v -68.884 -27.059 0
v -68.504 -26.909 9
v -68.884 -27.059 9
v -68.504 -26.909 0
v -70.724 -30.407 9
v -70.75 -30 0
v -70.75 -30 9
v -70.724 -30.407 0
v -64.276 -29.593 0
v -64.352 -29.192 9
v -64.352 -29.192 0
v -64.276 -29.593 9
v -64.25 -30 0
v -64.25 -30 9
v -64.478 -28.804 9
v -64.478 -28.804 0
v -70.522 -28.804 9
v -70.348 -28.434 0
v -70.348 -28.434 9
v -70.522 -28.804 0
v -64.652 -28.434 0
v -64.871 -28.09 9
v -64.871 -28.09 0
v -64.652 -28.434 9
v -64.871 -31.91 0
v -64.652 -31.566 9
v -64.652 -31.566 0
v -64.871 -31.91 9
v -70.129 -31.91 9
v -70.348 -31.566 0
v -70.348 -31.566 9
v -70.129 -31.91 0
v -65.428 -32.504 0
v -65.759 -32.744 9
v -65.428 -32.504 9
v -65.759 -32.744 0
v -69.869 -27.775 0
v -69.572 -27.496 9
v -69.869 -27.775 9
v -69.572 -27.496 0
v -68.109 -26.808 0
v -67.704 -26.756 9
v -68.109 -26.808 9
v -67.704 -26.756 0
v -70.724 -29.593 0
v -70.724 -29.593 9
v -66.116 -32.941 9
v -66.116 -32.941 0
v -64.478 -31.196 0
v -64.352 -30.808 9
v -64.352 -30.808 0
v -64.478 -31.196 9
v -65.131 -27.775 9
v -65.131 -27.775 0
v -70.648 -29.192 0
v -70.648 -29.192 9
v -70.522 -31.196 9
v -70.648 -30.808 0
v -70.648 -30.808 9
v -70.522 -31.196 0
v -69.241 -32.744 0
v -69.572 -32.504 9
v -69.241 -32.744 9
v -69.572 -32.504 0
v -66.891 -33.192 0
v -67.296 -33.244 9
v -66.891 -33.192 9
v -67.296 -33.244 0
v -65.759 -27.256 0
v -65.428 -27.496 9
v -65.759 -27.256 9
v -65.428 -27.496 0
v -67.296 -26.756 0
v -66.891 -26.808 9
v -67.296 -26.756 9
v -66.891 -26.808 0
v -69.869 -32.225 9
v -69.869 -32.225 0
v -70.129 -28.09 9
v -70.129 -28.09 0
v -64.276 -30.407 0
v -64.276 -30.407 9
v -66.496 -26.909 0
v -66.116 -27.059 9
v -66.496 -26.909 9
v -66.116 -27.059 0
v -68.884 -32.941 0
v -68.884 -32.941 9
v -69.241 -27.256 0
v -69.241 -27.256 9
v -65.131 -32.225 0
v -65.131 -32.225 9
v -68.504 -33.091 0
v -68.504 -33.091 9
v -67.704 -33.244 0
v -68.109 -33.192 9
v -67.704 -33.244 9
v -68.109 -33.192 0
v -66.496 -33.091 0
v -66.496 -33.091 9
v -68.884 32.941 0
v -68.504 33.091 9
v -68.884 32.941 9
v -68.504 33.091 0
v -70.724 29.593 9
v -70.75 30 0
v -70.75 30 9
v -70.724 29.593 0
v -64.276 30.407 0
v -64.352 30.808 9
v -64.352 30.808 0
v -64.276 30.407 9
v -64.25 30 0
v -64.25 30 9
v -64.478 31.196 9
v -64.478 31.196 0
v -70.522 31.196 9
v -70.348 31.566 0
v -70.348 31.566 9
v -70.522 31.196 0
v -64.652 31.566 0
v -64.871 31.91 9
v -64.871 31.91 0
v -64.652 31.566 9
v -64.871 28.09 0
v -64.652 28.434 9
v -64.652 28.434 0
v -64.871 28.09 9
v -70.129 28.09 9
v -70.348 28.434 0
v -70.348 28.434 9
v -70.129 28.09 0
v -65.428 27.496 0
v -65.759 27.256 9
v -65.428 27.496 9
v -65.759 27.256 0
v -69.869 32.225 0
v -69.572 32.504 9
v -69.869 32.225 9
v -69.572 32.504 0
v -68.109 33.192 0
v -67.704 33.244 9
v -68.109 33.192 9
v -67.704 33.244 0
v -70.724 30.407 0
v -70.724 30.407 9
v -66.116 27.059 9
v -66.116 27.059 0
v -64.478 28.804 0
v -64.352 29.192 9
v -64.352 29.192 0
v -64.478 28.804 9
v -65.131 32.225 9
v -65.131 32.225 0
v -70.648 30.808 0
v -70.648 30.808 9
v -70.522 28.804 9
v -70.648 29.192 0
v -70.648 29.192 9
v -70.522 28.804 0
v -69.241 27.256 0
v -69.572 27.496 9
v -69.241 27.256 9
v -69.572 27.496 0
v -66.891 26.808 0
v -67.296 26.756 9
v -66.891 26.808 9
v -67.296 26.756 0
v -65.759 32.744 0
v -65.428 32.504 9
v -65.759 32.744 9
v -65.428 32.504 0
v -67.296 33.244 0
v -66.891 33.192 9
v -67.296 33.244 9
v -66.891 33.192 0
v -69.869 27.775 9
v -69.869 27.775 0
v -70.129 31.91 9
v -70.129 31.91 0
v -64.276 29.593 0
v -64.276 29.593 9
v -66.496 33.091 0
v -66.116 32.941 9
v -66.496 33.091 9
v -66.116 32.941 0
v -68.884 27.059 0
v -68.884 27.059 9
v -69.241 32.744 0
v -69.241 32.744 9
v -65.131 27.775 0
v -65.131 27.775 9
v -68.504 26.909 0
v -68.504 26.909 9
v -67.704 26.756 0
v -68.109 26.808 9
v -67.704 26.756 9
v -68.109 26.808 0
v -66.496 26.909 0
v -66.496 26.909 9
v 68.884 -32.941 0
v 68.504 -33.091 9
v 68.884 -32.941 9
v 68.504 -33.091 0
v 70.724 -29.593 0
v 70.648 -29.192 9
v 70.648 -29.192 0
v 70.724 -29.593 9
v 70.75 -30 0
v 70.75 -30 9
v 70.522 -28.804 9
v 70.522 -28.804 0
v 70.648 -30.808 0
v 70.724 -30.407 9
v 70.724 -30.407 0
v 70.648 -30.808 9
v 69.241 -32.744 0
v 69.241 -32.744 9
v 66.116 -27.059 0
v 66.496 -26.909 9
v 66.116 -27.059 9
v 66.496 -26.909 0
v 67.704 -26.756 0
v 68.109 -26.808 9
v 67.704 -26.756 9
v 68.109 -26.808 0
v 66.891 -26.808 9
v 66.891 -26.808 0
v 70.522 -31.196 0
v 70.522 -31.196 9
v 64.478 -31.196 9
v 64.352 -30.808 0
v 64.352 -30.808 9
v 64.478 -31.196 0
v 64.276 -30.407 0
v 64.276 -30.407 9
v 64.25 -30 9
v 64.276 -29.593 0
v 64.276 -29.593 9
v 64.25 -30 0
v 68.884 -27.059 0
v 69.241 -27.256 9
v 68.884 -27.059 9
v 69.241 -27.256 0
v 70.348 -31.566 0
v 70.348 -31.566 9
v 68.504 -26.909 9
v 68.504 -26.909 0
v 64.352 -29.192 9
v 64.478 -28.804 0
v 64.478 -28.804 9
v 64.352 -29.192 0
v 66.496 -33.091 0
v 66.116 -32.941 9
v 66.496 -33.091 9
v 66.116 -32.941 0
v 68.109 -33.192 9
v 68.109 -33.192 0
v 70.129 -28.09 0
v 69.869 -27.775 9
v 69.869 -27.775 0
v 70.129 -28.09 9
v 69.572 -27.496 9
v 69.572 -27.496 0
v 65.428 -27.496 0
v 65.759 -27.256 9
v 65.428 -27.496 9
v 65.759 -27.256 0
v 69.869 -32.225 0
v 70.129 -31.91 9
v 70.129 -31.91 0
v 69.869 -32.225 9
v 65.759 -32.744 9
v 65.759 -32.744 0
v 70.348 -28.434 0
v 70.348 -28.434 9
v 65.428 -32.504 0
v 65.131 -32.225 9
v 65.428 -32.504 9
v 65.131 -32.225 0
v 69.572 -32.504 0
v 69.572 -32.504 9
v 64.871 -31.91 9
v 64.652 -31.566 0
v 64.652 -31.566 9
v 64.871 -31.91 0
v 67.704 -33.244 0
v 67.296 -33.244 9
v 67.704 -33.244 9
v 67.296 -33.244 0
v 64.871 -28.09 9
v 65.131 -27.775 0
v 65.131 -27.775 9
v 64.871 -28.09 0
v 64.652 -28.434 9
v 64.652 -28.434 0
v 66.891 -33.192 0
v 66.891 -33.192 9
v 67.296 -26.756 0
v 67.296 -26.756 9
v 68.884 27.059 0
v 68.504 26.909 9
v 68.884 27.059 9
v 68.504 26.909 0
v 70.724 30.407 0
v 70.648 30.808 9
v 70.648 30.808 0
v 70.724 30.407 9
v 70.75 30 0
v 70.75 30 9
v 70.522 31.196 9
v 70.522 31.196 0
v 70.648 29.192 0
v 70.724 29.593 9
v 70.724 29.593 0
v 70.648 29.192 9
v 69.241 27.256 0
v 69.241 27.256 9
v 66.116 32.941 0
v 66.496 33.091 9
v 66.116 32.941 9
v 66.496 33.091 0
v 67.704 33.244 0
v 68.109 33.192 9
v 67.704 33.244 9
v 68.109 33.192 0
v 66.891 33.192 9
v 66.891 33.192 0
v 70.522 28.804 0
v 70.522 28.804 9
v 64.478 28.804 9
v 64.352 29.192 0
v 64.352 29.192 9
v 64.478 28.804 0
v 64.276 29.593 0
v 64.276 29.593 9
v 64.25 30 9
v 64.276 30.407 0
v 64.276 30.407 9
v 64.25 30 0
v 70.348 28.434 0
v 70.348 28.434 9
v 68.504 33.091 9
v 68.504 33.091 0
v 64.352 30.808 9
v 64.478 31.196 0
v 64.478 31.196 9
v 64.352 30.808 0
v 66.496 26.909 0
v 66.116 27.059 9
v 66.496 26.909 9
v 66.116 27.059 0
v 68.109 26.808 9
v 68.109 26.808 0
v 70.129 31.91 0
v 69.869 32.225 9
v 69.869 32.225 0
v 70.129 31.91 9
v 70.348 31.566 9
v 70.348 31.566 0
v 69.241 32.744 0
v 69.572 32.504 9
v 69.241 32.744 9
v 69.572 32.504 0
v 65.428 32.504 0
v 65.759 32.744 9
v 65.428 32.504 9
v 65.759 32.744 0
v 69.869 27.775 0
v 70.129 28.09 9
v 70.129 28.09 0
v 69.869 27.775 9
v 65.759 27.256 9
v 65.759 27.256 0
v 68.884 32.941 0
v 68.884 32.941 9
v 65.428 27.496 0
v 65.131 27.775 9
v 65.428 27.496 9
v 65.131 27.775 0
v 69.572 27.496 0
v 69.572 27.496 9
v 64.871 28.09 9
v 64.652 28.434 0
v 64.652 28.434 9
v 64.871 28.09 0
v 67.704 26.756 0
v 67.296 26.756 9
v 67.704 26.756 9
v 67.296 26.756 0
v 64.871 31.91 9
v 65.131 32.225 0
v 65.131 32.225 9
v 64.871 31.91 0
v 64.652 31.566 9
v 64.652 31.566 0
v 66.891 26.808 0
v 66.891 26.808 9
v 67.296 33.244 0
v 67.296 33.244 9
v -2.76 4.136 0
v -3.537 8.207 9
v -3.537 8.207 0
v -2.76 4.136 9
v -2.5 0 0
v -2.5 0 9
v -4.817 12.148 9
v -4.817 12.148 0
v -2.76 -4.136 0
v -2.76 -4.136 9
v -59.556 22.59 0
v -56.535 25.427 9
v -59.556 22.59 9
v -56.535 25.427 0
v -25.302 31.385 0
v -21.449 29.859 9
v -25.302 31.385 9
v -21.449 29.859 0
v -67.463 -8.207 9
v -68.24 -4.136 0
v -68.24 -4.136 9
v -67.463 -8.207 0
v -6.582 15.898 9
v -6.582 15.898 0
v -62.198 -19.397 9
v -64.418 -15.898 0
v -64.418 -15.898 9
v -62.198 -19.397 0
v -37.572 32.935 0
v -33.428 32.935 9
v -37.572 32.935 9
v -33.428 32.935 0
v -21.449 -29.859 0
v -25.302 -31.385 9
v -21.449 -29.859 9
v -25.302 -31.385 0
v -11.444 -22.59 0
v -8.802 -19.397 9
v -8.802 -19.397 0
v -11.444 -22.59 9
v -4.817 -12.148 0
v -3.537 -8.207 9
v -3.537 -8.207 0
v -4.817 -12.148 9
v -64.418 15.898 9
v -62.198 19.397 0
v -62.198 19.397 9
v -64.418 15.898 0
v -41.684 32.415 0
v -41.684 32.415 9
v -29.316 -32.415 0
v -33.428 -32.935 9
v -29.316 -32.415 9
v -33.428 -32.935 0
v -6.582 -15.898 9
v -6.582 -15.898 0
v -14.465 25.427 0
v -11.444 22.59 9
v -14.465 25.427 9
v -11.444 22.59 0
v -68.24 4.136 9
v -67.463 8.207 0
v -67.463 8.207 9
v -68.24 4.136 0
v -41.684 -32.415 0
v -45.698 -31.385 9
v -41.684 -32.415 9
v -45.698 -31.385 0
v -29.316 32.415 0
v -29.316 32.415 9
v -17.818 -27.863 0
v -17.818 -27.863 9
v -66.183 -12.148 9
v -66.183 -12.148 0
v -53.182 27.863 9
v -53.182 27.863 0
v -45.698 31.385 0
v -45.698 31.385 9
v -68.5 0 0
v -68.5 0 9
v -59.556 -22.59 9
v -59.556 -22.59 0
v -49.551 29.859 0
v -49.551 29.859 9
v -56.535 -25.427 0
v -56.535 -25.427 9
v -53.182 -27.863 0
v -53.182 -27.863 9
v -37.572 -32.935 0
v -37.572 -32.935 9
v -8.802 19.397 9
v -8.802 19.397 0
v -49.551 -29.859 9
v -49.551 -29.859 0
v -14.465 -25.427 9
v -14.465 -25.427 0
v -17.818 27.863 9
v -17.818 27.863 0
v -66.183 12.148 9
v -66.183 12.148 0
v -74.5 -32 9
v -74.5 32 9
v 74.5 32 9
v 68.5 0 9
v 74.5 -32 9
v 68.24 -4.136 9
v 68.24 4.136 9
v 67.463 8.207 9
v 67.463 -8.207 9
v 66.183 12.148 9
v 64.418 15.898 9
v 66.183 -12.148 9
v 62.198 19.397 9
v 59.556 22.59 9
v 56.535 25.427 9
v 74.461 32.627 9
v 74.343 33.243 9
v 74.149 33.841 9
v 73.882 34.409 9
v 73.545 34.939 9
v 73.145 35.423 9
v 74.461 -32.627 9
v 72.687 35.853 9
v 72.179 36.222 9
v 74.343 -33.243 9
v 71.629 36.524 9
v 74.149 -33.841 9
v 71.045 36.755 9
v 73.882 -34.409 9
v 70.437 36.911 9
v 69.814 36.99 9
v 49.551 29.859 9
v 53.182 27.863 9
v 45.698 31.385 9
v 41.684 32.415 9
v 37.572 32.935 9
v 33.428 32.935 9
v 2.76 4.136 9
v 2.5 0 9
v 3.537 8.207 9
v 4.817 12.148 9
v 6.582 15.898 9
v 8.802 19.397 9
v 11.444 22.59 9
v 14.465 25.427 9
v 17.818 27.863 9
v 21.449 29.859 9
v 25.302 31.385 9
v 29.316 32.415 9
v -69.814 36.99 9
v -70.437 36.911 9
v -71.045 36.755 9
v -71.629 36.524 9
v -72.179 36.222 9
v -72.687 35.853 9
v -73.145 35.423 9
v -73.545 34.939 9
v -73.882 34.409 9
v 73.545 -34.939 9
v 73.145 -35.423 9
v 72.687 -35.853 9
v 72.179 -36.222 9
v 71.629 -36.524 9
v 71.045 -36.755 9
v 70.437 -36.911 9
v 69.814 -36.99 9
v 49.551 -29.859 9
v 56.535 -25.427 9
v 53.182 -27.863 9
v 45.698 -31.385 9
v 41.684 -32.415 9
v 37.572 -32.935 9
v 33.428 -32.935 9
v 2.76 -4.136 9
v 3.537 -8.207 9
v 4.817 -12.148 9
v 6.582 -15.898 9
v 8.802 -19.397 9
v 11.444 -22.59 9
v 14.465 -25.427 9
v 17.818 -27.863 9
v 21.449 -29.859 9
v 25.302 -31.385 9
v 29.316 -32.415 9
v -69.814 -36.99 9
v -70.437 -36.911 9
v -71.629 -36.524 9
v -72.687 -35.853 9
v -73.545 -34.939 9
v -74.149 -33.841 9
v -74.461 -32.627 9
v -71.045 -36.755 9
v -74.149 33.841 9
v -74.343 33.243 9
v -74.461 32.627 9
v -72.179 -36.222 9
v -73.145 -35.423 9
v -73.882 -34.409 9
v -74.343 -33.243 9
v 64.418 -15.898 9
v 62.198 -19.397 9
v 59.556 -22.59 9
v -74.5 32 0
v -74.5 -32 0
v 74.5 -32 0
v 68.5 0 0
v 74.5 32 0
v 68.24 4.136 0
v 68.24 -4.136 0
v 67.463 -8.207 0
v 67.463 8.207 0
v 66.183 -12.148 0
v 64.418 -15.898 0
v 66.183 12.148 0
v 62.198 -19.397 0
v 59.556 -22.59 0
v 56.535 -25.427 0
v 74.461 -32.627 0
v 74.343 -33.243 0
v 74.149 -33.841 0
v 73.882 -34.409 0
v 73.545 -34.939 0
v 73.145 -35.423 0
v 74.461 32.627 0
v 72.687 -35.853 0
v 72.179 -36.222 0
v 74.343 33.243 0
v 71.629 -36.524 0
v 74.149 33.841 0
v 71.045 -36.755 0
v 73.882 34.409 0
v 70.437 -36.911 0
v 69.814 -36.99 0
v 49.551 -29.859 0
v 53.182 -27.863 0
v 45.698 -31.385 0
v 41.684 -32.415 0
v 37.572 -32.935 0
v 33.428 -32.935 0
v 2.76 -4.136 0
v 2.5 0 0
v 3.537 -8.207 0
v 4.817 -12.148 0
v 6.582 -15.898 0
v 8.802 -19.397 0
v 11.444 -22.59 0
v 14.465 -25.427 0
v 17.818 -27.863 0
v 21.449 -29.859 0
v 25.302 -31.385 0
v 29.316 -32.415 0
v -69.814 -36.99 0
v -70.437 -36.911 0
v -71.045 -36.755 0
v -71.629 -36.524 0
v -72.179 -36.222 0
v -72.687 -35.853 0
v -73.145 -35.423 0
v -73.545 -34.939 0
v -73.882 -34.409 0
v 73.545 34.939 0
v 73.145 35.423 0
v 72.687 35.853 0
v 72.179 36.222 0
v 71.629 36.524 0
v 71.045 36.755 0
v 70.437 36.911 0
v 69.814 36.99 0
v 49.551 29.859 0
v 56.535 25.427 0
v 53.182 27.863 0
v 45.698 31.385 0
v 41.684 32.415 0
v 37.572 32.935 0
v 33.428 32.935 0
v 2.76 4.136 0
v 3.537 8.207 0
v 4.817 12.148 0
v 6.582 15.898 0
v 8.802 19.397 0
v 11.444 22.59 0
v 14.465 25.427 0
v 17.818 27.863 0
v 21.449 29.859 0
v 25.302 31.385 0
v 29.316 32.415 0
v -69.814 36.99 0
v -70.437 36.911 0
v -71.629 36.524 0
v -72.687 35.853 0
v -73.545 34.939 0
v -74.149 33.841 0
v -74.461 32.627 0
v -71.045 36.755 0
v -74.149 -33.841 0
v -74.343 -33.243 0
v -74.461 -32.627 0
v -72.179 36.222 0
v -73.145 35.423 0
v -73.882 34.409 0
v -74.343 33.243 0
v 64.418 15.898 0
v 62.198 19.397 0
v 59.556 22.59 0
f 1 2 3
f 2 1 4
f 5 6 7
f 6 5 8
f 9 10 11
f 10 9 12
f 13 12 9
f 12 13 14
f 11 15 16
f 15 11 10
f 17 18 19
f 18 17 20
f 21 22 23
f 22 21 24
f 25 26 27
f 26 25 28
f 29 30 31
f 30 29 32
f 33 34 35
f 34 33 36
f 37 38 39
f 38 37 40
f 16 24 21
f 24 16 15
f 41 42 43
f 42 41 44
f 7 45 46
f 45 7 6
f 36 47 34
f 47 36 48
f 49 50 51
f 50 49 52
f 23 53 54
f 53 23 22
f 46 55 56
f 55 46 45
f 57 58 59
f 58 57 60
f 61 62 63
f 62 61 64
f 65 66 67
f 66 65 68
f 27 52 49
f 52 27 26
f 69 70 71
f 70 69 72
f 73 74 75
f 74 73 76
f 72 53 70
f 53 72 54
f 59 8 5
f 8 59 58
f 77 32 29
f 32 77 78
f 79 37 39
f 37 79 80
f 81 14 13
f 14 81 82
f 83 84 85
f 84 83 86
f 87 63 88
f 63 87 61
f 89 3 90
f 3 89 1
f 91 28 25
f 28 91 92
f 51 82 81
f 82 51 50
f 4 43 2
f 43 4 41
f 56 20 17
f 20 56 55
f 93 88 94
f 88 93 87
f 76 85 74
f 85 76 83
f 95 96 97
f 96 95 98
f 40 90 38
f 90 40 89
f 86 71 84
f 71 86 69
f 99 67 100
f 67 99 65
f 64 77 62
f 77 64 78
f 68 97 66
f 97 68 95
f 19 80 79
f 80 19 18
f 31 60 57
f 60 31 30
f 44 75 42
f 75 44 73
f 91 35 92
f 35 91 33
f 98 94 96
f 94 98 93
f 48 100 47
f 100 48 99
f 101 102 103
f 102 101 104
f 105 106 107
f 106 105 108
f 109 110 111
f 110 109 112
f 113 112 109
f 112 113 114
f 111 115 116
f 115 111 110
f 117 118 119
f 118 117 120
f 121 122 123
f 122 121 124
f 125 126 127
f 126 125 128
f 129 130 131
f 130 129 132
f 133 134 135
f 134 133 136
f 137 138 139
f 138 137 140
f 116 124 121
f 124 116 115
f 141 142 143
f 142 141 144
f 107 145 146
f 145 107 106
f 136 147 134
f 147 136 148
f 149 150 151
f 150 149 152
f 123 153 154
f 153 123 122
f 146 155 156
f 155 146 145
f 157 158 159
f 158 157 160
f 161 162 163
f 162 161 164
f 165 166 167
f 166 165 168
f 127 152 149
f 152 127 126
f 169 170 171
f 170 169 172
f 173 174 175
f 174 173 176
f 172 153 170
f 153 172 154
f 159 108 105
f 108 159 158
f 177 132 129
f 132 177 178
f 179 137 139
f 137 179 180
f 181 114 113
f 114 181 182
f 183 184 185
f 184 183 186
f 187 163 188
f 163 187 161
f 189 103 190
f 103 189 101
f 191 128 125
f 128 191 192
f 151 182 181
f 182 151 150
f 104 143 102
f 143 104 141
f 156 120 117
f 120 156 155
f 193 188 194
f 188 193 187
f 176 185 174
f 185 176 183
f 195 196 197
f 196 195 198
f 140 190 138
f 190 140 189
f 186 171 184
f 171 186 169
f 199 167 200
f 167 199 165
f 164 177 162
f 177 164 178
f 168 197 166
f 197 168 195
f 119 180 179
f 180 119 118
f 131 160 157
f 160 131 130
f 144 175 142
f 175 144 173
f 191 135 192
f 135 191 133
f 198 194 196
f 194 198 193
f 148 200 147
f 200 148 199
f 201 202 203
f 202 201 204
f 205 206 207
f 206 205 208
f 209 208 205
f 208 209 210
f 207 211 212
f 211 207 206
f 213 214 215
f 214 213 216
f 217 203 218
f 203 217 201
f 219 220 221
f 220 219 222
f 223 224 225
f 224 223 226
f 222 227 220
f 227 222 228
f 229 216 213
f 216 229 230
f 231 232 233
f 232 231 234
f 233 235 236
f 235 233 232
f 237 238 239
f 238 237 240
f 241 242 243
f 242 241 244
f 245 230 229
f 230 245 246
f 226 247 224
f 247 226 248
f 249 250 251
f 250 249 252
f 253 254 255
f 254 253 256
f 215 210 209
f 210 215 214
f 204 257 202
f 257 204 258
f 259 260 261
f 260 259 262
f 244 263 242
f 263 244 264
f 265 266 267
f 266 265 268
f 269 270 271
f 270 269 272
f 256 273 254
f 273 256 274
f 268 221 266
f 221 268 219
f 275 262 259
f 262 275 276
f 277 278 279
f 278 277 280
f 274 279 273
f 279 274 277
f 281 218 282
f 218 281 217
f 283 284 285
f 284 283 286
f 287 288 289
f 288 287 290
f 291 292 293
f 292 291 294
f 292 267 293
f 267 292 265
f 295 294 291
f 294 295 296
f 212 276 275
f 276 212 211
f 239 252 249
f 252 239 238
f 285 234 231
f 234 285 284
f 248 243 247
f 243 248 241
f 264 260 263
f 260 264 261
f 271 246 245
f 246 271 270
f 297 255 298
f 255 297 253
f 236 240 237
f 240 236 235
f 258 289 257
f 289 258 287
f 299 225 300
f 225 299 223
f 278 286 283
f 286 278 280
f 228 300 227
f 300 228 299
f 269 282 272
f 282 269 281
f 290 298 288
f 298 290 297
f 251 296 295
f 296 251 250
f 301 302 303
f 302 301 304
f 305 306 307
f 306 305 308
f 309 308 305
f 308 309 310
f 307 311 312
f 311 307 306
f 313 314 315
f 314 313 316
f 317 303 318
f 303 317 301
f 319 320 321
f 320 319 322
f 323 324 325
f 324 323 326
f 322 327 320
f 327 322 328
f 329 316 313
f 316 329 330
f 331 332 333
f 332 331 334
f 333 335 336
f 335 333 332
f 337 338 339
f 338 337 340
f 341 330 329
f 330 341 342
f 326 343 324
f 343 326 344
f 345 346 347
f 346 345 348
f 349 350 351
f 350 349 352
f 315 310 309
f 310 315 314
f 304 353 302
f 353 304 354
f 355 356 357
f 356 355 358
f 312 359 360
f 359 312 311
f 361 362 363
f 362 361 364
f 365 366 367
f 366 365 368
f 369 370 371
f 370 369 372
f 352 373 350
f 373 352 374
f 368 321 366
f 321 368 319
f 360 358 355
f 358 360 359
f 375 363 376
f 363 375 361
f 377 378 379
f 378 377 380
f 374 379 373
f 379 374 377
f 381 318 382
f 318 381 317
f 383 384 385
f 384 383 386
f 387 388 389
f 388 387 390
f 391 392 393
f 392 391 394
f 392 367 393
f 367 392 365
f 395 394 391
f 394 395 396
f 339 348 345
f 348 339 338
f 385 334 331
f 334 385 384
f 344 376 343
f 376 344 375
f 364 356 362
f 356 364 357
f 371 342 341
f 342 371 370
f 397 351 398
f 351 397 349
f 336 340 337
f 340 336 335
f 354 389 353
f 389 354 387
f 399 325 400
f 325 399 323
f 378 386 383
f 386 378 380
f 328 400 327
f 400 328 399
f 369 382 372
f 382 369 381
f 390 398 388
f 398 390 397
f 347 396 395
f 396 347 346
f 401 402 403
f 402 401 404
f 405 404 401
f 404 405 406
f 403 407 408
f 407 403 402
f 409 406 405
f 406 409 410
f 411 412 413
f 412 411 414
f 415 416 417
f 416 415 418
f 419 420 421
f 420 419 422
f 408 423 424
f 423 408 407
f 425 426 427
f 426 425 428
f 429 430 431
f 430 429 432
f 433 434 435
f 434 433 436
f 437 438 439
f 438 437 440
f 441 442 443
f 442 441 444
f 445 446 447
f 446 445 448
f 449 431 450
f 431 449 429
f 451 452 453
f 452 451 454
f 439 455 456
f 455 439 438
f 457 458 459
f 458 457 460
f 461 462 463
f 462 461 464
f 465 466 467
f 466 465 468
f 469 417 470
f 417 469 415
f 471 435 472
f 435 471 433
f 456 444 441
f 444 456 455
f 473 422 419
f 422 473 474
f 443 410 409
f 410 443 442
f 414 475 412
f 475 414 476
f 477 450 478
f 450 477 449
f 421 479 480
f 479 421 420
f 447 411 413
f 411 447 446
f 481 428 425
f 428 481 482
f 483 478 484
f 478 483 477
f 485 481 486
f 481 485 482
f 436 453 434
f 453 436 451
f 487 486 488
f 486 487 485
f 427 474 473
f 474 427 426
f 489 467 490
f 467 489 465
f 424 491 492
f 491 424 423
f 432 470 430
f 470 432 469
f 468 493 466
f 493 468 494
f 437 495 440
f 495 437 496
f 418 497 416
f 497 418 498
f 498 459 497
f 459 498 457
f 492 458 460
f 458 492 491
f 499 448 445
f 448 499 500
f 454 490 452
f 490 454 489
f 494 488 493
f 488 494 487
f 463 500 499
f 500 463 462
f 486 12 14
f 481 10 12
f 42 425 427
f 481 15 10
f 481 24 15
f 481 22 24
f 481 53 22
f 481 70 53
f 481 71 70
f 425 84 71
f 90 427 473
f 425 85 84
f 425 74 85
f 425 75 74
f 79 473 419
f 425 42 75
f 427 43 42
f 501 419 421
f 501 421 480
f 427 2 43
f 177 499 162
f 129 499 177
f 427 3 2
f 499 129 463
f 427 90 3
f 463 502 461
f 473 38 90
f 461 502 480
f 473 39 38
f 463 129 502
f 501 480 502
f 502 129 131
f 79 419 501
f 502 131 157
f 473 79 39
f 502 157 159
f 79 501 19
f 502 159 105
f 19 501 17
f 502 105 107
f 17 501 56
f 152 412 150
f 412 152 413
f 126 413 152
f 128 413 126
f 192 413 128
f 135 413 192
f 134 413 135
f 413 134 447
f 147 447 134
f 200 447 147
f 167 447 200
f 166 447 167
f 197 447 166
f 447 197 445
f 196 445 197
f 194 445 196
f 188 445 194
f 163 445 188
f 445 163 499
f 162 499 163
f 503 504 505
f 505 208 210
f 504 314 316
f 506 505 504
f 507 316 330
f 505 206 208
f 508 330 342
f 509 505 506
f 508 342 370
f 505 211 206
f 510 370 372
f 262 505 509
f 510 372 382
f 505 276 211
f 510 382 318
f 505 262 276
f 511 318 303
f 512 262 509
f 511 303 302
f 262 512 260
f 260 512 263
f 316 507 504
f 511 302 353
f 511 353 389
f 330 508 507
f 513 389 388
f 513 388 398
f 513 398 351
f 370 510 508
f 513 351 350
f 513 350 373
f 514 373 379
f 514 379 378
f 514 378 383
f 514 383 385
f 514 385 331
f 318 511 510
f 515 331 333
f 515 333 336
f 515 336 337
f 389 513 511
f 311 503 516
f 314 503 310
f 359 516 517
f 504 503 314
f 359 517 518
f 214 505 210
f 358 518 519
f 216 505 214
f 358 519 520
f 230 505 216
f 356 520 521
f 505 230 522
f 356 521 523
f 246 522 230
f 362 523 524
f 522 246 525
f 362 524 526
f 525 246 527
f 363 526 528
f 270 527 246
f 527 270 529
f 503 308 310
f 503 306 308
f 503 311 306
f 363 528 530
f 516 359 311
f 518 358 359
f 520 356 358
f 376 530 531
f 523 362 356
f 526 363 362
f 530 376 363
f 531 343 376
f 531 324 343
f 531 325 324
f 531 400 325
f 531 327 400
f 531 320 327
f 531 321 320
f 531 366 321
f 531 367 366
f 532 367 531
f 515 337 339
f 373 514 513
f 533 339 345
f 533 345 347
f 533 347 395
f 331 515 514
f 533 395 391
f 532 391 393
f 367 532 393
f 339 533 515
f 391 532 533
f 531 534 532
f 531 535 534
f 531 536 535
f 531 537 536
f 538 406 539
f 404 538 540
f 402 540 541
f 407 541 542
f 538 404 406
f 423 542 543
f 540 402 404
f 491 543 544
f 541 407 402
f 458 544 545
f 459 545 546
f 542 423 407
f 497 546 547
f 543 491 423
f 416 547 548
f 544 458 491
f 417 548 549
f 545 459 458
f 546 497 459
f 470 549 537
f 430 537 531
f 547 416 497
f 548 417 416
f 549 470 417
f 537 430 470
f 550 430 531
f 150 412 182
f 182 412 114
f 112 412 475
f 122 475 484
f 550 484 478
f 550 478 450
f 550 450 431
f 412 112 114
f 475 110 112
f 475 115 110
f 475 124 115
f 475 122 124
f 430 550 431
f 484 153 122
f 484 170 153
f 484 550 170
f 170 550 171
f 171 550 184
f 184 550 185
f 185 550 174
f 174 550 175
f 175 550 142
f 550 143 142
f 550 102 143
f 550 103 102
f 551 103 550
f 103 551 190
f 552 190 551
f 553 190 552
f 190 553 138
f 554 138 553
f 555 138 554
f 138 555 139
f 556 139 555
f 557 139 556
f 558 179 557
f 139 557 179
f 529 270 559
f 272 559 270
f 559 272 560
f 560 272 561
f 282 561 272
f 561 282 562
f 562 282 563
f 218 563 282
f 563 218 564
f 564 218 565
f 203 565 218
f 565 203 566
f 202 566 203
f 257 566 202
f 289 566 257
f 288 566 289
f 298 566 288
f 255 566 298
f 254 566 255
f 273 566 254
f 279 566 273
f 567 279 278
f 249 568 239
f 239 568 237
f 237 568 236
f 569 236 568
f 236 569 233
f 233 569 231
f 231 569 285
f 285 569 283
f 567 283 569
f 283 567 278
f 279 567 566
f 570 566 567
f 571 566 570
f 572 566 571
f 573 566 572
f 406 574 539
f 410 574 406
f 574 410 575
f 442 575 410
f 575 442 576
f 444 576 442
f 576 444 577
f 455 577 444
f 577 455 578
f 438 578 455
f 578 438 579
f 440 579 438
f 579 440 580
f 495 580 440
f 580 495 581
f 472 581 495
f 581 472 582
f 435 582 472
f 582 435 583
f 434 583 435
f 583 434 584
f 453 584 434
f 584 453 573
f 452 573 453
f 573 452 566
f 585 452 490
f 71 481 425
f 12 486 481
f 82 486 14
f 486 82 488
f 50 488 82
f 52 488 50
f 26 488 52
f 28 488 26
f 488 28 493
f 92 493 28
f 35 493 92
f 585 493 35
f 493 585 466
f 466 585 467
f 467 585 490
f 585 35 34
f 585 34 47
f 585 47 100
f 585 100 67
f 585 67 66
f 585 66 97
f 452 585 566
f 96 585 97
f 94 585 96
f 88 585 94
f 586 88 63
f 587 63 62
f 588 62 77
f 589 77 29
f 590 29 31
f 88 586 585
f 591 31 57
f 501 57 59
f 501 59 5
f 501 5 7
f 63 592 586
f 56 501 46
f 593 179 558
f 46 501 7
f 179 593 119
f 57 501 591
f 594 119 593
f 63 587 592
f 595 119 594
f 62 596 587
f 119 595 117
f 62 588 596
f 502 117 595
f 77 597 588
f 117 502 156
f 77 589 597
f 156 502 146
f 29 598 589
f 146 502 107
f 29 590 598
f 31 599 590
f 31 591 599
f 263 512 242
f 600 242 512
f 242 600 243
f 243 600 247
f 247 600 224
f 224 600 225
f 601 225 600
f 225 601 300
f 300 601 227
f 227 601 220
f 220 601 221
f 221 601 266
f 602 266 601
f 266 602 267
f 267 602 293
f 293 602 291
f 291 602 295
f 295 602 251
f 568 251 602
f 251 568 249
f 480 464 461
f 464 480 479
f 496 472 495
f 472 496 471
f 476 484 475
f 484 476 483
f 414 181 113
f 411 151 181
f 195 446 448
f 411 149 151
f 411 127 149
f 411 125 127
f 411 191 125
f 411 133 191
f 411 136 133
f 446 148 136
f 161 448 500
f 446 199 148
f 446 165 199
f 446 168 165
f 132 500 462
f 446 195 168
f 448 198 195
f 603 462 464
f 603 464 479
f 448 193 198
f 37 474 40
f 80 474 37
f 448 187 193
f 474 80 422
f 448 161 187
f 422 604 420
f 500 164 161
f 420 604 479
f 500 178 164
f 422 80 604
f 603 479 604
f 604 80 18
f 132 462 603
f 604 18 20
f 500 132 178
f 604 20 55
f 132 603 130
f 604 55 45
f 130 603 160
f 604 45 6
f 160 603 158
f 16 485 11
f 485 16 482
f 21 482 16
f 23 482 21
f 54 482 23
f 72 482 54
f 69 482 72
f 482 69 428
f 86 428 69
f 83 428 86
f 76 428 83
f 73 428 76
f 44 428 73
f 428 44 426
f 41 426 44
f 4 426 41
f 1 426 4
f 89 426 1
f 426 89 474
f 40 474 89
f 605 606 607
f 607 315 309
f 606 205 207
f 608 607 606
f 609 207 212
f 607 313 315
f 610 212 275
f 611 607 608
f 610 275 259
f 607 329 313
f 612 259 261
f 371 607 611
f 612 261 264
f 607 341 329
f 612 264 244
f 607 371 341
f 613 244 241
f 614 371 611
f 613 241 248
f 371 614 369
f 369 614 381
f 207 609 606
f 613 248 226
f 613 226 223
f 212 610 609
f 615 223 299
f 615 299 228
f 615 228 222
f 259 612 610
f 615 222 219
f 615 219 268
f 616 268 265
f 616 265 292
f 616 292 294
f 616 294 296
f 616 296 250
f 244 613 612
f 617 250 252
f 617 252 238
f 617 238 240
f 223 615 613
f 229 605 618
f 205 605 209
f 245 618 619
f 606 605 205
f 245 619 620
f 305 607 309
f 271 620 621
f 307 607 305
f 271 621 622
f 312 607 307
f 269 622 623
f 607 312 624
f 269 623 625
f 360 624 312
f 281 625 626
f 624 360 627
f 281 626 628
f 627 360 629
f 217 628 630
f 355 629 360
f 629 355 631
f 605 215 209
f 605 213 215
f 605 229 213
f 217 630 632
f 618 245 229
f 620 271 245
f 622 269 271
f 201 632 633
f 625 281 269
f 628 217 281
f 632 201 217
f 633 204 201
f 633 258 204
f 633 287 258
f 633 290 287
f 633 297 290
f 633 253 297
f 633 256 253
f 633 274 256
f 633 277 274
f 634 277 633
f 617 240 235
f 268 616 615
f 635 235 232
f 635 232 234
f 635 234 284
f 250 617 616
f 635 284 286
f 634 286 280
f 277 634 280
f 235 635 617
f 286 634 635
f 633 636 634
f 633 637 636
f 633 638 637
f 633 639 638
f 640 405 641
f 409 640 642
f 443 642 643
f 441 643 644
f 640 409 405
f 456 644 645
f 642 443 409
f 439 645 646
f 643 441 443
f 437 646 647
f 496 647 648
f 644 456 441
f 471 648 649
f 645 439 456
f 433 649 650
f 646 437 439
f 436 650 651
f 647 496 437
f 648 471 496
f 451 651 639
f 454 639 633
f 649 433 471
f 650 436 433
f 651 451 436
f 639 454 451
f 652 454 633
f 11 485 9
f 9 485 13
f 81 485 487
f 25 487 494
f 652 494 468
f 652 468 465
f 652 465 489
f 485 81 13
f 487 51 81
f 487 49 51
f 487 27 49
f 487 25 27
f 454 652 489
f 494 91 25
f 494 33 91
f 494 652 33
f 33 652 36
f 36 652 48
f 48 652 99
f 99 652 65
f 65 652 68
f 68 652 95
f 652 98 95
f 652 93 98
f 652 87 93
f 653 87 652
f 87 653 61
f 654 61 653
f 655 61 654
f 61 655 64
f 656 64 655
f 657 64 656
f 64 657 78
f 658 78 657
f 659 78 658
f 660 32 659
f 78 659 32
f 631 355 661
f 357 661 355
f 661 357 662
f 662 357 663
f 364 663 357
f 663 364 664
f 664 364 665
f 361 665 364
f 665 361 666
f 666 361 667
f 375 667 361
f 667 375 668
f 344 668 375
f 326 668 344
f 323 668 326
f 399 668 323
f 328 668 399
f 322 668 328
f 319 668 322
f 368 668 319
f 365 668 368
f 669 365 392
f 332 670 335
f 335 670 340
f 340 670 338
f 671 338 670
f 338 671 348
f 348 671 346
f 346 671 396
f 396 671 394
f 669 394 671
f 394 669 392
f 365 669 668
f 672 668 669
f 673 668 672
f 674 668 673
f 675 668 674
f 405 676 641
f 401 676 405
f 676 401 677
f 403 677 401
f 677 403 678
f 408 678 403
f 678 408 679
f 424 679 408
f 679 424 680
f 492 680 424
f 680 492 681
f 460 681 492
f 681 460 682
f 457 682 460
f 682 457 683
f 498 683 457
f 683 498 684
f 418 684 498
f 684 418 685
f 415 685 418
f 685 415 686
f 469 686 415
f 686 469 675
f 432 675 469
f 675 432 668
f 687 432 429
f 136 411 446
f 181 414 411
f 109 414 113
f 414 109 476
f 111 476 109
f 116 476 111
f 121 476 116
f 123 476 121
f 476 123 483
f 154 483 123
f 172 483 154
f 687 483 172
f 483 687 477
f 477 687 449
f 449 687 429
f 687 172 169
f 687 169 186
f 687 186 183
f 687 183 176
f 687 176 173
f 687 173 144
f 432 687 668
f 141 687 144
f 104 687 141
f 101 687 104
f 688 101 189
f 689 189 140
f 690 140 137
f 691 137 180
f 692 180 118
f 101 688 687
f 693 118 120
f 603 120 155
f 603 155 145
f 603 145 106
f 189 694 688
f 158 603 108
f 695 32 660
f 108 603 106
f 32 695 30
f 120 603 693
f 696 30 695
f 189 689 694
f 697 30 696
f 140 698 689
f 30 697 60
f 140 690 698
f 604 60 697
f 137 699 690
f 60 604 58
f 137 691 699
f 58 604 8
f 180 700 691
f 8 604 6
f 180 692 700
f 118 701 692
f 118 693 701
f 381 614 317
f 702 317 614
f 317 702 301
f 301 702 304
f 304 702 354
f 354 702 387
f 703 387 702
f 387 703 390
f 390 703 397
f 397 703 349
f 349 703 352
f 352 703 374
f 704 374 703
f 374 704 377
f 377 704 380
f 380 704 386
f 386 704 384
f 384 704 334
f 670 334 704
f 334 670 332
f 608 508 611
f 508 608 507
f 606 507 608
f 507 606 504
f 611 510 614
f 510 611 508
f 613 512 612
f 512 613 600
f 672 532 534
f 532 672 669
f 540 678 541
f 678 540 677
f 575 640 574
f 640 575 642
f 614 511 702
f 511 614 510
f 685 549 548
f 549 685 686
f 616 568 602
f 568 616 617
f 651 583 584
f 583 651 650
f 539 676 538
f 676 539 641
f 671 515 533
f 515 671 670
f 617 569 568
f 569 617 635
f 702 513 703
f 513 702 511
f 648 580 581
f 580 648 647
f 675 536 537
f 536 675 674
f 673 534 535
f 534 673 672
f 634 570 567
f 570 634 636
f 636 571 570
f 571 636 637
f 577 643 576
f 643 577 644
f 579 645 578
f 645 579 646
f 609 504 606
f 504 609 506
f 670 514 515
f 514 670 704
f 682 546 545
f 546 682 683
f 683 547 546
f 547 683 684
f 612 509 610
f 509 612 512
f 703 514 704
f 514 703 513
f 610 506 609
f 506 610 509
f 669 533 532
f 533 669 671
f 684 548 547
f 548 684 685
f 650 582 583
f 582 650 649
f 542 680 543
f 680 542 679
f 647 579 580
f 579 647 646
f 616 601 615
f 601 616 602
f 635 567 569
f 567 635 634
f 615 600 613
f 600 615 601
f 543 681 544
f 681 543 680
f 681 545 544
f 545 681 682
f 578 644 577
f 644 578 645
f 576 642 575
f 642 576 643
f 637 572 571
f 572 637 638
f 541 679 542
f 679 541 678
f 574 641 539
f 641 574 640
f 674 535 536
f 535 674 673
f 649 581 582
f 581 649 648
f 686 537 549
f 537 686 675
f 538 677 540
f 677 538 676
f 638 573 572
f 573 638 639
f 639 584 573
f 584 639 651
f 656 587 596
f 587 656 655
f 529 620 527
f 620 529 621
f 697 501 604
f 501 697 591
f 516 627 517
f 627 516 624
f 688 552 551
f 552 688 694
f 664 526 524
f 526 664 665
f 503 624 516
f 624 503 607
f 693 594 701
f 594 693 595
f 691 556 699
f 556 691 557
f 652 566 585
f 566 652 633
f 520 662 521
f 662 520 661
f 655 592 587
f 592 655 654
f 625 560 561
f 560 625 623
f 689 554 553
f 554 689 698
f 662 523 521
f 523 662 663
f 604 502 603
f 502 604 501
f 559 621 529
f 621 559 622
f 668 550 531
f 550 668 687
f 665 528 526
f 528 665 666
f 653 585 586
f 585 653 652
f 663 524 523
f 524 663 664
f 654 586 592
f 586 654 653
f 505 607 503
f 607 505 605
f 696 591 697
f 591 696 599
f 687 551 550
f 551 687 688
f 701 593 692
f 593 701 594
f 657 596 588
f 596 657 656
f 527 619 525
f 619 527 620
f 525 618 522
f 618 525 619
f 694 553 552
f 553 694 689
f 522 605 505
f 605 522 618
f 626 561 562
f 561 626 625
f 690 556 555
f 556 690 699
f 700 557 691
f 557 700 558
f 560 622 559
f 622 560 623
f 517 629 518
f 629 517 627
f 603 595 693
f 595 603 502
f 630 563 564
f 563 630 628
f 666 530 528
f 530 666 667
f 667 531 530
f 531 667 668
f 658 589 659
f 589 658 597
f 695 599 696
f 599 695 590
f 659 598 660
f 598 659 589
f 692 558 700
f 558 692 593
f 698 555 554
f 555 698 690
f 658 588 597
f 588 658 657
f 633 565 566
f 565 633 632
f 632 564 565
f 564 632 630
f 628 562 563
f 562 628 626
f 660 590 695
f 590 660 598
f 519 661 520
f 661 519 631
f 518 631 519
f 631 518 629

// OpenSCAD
$fn = 50;


difference() {
	union() {
		hull() {
			translate(v = [-69.5000000000, 32.0000000000, 0]) {
				cylinder(h = 9, r = 5);
			}
			translate(v = [69.5000000000, 32.0000000000, 0]) {
				cylinder(h = 9, r = 5);
			}
			translate(v = [-69.5000000000, -32.0000000000, 0]) {
				cylinder(h = 9, r = 5);
			}
			translate(v = [69.5000000000, -32.0000000000, 0]) {
				cylinder(h = 9, r = 5);
			}
		}
	}
	union() {
		#translate(v = [-67.5000000000, -30.0000000000, -100.0000000000]) {
			cylinder(h = 200, r = 3.2500000000);
		}
		#translate(v = [-67.5000000000, 30.0000000000, -100.0000000000]) {
			cylinder(h = 200, r = 3.2500000000);
		}
		#translate(v = [67.5000000000, -30.0000000000, -100.0000000000]) {
			cylinder(h = 200, r = 3.2500000000);
		}
		#translate(v = [67.5000000000, 30.0000000000, -100.0000000000]) {
			cylinder(h = 200, r = 3.2500000000);
		}
		#translate(v = [-35.5000000000, 0, 0]) {
			cylinder(h = 9, r = 33.0000000000);
		}
		#translate(v = [35.5000000000, 0, 0]) {
			cylinder(h = 9, r = 33.0000000000);
		}
	}
}
